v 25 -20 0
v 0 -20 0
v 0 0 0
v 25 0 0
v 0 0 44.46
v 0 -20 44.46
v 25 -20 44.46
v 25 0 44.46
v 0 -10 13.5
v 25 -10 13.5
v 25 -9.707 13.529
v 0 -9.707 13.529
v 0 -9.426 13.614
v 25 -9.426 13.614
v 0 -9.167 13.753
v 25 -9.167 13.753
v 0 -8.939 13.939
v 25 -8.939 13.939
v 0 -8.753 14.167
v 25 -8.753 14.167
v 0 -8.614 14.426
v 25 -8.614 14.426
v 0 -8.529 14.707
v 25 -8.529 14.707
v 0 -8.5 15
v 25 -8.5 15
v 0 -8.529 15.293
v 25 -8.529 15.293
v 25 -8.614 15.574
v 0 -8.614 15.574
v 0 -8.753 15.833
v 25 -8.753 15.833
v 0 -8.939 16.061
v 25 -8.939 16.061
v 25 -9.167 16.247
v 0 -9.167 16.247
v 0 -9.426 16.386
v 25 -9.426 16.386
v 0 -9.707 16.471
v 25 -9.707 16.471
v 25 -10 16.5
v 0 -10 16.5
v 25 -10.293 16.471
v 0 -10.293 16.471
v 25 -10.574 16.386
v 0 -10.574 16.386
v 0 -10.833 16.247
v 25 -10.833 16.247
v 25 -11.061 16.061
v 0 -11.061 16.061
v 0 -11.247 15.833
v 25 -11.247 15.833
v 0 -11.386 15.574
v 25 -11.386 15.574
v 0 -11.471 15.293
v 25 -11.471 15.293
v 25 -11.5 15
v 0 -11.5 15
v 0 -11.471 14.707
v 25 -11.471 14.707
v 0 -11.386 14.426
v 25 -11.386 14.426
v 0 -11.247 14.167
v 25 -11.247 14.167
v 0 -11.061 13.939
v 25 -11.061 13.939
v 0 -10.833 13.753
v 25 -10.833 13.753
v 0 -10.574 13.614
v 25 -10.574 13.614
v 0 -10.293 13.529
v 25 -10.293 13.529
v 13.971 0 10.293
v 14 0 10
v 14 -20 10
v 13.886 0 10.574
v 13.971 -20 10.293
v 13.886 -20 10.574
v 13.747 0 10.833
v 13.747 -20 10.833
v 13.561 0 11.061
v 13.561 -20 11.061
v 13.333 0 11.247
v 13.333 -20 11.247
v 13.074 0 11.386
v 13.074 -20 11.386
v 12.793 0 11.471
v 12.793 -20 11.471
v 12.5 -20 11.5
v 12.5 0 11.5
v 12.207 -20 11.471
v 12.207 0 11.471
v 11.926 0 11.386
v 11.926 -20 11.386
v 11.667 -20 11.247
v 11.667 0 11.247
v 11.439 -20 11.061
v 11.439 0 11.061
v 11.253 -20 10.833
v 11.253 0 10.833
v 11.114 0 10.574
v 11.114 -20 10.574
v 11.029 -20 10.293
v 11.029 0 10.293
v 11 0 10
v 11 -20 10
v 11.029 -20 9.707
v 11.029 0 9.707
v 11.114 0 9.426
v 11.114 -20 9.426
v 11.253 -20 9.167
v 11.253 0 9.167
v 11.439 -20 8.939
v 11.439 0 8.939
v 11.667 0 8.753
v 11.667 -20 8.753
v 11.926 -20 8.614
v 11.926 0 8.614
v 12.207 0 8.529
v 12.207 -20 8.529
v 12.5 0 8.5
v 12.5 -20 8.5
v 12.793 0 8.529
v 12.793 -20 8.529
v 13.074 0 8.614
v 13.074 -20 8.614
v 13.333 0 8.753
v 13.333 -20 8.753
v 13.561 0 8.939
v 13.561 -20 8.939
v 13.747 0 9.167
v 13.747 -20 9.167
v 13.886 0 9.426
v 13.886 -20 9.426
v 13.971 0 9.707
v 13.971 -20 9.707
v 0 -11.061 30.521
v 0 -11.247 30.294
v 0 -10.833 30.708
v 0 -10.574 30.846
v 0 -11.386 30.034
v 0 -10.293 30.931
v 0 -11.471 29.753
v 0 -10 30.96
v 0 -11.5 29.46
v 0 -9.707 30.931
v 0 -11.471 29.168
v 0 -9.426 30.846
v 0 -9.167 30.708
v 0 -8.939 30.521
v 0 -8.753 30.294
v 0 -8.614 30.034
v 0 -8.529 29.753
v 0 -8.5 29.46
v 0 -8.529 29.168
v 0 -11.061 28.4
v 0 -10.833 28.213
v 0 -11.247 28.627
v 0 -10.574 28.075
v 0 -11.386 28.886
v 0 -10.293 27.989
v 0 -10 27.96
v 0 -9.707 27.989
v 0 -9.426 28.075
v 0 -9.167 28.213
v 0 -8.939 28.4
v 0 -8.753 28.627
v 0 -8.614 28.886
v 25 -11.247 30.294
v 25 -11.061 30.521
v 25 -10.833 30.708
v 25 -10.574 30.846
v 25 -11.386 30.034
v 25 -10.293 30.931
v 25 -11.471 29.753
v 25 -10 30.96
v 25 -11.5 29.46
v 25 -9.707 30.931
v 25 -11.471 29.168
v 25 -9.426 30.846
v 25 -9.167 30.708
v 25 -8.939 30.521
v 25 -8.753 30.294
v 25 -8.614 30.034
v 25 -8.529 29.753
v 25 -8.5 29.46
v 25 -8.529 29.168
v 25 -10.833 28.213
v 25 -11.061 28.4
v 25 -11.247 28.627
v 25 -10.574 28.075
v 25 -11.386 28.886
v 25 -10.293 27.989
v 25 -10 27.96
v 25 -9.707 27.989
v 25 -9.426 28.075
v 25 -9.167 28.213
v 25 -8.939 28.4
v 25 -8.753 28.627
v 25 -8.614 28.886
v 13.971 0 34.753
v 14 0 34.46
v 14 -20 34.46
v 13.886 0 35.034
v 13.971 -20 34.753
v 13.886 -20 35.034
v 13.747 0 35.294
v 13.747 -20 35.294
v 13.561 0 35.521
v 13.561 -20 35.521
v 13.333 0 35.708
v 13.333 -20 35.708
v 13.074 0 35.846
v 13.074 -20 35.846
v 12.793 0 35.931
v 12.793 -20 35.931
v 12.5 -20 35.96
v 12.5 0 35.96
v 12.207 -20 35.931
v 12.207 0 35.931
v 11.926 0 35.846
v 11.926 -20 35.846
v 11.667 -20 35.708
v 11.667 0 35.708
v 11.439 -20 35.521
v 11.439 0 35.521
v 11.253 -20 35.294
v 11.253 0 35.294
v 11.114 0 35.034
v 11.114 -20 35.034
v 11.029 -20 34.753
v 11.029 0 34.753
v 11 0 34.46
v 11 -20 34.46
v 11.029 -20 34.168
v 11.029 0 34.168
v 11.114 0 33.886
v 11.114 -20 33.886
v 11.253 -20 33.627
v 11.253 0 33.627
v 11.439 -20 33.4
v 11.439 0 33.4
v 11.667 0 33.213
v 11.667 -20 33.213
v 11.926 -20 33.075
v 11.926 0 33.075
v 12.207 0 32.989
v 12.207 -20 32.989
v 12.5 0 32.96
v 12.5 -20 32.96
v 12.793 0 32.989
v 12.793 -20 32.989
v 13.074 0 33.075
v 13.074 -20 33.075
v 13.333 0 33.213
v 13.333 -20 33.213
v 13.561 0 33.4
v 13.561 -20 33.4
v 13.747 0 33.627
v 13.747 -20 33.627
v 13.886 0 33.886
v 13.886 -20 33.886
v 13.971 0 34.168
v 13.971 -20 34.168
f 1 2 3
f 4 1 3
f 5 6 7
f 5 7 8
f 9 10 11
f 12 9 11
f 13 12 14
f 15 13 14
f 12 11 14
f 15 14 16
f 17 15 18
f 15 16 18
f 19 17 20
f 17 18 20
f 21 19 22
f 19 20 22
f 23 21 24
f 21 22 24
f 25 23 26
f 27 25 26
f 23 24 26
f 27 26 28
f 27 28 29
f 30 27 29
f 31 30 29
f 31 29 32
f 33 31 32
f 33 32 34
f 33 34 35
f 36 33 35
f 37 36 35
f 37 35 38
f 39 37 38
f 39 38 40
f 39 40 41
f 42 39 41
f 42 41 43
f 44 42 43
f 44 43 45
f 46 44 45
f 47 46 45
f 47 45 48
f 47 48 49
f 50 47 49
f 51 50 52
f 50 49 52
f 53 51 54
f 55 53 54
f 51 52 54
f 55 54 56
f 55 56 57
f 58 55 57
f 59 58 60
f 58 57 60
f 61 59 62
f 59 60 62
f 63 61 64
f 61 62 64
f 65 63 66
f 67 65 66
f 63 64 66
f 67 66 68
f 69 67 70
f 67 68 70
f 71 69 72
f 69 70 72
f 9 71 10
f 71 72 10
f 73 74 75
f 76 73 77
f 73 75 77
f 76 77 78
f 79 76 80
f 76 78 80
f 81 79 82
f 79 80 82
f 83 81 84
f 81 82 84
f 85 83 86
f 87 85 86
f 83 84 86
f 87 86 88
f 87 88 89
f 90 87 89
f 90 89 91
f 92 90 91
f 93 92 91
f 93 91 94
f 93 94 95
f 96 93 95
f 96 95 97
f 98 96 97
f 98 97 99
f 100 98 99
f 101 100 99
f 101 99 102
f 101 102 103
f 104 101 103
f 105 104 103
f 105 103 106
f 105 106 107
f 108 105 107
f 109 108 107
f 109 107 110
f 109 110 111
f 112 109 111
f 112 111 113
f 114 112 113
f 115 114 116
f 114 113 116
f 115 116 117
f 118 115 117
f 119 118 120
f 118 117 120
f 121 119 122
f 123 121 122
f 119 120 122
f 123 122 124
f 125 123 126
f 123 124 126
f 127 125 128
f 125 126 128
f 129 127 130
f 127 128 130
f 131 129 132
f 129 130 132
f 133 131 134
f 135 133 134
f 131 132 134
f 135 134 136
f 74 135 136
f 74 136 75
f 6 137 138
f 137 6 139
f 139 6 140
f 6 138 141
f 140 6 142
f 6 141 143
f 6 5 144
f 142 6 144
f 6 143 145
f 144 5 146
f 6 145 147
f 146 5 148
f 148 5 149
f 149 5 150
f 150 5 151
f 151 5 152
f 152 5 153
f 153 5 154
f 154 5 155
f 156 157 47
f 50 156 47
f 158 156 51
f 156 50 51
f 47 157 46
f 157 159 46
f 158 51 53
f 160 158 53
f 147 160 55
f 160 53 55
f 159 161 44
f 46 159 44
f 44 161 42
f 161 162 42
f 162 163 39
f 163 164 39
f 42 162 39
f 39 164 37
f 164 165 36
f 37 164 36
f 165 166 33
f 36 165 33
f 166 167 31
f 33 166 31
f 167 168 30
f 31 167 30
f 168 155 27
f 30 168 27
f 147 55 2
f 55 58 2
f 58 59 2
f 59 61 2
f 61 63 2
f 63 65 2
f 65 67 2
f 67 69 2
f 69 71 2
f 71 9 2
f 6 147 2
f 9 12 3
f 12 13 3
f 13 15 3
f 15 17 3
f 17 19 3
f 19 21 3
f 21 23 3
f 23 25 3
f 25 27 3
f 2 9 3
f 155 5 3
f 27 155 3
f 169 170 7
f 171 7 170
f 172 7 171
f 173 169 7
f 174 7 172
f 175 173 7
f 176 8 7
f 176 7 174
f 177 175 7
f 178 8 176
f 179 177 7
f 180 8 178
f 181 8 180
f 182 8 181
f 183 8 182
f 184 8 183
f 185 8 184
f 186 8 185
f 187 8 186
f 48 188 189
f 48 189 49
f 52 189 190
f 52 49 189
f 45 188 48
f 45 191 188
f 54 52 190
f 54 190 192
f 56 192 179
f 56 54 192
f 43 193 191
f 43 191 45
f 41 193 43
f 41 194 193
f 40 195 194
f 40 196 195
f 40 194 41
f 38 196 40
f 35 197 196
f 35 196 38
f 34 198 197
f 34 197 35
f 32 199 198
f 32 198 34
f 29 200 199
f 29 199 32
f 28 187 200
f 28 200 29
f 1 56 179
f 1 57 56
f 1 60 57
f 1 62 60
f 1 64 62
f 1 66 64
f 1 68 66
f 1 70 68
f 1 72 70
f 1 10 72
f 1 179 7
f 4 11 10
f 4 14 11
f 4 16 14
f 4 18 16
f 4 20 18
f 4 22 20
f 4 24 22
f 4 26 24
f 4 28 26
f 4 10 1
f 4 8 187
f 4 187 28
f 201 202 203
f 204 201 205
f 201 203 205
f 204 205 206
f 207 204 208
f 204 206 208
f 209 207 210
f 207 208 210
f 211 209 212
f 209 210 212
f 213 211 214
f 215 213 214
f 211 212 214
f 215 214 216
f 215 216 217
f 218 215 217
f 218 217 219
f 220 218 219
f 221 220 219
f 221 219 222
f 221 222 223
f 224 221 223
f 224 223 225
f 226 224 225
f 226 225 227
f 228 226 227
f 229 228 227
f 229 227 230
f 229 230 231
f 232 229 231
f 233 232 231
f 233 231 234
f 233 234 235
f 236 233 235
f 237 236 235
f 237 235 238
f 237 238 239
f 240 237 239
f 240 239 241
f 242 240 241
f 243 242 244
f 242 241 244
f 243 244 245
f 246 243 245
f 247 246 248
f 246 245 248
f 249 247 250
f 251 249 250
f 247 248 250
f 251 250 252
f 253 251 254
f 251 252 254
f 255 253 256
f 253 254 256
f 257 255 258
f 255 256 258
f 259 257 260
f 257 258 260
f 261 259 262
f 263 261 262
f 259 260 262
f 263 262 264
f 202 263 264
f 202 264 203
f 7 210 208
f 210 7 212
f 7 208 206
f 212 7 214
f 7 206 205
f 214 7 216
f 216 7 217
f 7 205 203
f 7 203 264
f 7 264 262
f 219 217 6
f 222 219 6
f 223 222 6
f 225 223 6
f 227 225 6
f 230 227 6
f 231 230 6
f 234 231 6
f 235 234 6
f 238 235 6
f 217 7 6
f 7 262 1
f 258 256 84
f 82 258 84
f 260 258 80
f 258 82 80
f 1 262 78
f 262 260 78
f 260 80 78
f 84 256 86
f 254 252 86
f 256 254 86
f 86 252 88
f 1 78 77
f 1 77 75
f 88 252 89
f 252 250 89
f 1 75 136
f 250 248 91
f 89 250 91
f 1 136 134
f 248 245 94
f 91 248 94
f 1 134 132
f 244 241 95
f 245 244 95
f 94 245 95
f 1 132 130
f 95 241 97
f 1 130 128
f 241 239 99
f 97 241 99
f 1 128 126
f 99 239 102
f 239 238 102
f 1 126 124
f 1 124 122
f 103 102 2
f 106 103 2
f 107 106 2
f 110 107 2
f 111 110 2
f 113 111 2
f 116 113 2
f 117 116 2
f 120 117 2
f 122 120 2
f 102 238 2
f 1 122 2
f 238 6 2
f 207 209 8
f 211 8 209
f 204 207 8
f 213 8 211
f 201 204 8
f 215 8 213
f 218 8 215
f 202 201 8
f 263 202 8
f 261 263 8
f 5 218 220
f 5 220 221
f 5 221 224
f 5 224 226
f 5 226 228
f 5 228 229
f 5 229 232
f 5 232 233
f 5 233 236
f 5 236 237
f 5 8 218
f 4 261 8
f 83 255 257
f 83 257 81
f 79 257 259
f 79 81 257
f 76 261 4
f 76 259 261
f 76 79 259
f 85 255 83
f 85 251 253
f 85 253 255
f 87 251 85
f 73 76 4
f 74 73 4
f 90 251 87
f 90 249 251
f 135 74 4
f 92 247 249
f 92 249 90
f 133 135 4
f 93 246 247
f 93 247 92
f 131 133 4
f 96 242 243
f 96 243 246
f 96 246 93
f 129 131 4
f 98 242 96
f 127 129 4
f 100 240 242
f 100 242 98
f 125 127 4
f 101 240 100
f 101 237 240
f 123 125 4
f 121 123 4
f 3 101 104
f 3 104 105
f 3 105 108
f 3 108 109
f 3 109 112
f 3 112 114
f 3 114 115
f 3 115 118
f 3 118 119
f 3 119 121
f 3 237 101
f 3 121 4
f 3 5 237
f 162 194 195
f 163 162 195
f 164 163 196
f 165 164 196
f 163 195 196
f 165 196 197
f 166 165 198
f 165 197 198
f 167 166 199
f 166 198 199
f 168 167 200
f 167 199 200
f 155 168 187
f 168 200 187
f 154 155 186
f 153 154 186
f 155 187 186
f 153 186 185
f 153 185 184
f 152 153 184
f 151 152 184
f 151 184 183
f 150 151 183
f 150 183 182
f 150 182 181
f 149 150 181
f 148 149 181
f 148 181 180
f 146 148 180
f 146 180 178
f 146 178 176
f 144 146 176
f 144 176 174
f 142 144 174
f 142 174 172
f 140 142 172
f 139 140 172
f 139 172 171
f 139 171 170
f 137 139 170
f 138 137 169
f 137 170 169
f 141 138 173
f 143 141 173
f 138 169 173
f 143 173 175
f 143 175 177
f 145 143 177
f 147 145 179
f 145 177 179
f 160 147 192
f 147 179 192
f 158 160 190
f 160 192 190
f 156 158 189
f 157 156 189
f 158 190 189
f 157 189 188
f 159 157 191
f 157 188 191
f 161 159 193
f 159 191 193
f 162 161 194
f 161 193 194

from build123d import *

# Parameters (mm, degrees)
CROQUIS2_W              = 44.460320701
CROQUIS2_H              = 20
SALIENTE_EXTRUIR2_DEPTH = 25
CROQUIS3_R              = 1.5
CORTAR_EXTRUIR1_DEPTH   = 21
CROQUIS4_R              = 1.5
CORTAR_EXTRUIR2_DEPTH   = 50


with BuildPart() as part:
    # Croquis2 → Saliente-Extruir2 (new body)
    with BuildSketch(Plane(origin=(0, 0, 0), x_dir=(0, 0, -1), z_dir=(1, 0, 0))):
        with Locations((-22.230160351, -10)):
            Rectangle(CROQUIS2_W, CROQUIS2_H)
    extrude(amount=SALIENTE_EXTRUIR2_DEPTH)

    # Croquis3 → Cortar-Extruir1 (cut, through all)
    with BuildSketch(Plane.XZ.offset(20)):
        with Locations((12.5, 10)):
            Circle(CROQUIS3_R)
        with Locations((12.5, 34.460320701)):
            Circle(CROQUIS3_R)
    extrude(amount=-CORTAR_EXTRUIR1_DEPTH, mode=Mode.SUBTRACT)

    # Croquis4 → Cortar-Extruir2 (cut)
    with BuildSketch(Plane(origin=(25, 0, 0), x_dir=(0, 0, -1), z_dir=(1, 0, 0))):
        with Locations((-29.460320701, -10)):
            Circle(CROQUIS4_R)
        with Locations((-15, -10)):
            Circle(CROQUIS4_R)
    extrude(amount=-CORTAR_EXTRUIR2_DEPTH, mode=Mode.SUBTRACT)


solid = part.part
